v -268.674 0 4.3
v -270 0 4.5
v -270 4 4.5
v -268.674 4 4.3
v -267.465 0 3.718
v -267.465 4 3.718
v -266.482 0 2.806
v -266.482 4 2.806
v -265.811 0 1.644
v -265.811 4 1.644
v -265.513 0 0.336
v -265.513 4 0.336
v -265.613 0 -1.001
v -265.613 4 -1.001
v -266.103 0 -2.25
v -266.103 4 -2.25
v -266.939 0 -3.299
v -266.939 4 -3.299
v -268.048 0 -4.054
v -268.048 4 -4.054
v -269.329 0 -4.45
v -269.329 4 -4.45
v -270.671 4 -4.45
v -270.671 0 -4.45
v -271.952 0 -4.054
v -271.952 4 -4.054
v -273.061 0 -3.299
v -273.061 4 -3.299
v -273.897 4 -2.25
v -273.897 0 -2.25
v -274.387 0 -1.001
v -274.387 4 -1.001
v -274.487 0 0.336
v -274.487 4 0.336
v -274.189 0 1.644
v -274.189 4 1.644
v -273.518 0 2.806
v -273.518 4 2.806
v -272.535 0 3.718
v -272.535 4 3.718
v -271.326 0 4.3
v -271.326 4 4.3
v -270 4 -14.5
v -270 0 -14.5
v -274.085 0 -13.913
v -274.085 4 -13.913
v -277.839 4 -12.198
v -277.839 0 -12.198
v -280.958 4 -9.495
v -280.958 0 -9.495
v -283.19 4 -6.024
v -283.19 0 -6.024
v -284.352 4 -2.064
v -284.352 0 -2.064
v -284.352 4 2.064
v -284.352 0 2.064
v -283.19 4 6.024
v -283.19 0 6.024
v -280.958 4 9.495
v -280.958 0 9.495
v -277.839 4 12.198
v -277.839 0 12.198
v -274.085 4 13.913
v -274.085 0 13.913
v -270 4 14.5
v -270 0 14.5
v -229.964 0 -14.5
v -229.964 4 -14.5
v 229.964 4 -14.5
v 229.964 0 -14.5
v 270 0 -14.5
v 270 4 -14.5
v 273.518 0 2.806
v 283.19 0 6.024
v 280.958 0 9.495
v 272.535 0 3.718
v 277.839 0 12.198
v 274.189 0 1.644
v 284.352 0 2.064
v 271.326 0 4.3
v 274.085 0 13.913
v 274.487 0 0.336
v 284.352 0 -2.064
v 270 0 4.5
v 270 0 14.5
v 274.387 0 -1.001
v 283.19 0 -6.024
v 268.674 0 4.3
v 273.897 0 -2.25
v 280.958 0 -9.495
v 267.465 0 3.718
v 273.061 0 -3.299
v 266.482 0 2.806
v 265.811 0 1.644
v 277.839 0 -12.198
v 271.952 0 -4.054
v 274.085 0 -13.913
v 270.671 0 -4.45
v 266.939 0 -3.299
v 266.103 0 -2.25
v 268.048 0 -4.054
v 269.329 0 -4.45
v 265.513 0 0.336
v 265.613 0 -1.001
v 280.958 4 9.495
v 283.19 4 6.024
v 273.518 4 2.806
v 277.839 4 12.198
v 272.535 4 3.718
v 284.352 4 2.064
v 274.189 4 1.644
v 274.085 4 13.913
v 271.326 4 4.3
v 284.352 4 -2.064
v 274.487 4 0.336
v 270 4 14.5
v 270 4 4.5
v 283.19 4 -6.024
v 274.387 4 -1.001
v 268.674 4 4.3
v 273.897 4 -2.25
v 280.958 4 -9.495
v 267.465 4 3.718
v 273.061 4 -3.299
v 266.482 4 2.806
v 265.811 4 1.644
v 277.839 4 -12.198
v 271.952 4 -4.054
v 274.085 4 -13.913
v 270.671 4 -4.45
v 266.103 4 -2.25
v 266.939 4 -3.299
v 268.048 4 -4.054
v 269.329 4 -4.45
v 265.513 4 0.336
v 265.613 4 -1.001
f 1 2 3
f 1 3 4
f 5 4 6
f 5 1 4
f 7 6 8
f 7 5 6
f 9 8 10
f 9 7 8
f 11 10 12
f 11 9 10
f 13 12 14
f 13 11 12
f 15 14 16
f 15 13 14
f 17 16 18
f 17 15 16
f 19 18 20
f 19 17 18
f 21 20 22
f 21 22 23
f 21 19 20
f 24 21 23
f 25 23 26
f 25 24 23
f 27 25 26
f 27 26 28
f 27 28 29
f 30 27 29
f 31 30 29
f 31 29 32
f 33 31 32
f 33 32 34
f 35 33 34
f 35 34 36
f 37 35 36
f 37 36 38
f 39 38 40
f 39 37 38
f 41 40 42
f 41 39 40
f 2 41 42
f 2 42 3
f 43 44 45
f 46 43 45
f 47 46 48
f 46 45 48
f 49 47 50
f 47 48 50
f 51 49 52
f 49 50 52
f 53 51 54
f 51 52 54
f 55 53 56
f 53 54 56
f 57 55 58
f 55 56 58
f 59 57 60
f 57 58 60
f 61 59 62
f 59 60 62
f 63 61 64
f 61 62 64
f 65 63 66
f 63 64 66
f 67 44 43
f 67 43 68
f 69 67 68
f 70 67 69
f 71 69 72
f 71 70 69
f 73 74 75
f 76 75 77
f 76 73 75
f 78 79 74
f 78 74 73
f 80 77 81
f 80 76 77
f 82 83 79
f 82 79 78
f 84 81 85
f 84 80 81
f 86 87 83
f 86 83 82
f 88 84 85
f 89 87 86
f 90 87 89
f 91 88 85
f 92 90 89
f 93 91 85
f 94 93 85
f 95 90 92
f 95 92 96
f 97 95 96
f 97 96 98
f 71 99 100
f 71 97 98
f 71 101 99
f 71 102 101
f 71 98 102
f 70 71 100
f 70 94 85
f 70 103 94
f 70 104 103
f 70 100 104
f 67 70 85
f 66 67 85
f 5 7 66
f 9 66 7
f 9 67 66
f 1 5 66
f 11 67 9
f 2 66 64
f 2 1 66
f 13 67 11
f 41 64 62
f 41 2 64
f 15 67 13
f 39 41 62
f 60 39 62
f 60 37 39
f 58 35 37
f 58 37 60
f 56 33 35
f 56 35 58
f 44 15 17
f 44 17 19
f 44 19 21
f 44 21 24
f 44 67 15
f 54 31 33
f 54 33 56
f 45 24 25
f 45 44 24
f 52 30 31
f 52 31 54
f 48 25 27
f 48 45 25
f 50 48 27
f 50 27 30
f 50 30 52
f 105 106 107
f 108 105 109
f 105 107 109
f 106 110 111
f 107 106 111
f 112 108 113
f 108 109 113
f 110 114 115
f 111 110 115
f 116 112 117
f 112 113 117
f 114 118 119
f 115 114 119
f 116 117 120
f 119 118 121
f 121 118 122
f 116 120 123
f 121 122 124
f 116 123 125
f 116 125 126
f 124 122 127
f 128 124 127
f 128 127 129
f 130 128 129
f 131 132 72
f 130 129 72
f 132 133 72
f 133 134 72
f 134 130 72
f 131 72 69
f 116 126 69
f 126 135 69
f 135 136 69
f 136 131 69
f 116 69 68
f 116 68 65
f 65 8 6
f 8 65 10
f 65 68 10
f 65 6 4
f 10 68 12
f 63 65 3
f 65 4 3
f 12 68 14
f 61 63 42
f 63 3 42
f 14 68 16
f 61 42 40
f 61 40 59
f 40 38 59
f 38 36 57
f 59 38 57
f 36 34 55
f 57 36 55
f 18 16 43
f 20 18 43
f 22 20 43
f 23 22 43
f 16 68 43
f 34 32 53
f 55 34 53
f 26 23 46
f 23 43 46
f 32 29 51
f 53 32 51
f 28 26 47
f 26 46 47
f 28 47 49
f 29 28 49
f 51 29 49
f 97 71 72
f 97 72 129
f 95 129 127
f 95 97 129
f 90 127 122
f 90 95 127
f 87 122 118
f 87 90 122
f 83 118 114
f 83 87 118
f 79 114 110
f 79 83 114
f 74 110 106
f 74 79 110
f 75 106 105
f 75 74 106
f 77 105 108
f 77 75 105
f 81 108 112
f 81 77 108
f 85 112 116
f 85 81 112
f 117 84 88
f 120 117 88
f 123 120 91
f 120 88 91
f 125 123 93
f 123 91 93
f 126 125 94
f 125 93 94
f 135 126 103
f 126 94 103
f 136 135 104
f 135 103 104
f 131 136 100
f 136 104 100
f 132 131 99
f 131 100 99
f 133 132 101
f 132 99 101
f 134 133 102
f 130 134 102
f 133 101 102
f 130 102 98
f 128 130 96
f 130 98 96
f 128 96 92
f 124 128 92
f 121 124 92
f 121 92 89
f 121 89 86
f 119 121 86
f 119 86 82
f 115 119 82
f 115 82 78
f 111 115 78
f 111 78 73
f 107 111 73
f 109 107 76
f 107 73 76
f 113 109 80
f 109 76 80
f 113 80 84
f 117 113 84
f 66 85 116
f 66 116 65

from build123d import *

# Parameters (mm, degrees)
SKETCH1_R           = 4.5
SKETCH1_R_2         = 6.5
SKETCH1_R_3         = 1.75
BOSS_EXTRUDE1_DEPTH = 4
SKETCH2_R           = 2
CUT_EXTRUDE1_DEPTH  = 4
SKETCH3_W           = 459.927601586
SKETCH3_H           = 370.798064125
CUT_EXTRUDE2_DEPTH  = 10


with BuildPart() as part:
    # Sketch1 → Boss-Extrude1 (new body)
    with BuildSketch(Plane(origin=(0, 0, 0), x_dir=(1, 0, 0), z_dir=(0, 1, 0))):
        with BuildLine():
            Line((-270, -14.5), (0, -14.5))
            Line((0, -14.5), (0, 340))
            Line((0, 340), (-175.463800793, 340))
            ThreePointArc((-175.463800793, 340), (-185.71684912, 335.753048327), (-189.963800793, 325.5))
            Line((-189.963800793, 325.5), (-189.963800793, 225.606590828))
            ThreePointArc((-189.963800793, 225.606590828), (-204.963800793, 210.606590828), (-189.963800793, 195.606590828))
            Line((-189.963800793, 195.606590828), (-189.963800793, 54.5))
            Line((-189.963800793, 54.5), (-229.963800793, 14.5))
            Line((-229.963800793, 14.5), (-270, 14.5))
            ThreePointArc((-270, 14.5), (-284.5, 0), (-270, -14.5))
        make_face()
        with Locations(Location((-270, 0, 0), (0, 0, 270))):
            Circle(SKETCH1_R, mode=Mode.SUBTRACT)
        with Locations(Location((-175.463800793, 325.5, 0), (0, 0, 270))):
            Circle(SKETCH1_R, mode=Mode.SUBTRACT)
        with Locations(Location((-189.963800793, 210.606590828, 0), (0, 0, 270))):
            Circle(SKETCH1_R_2, mode=Mode.SUBTRACT)
        with Locations(Location((-180.213800793, 210.606590828, 0), (0, 0, 270))):
            Circle(SKETCH1_R_3, mode=Mode.SUBTRACT)
        with Locations(Location((-189.963800793, 220.406590828, 0), (0, 0, 270))):
            Circle(SKETCH1_R_3, mode=Mode.SUBTRACT)
        with Locations(Location((-189.963800793, 200.806590828, 0), (0, 0, 270))):
            Circle(SKETCH1_R_3, mode=Mode.SUBTRACT)
        with Locations(Location((-199.713800793, 210.606590828, 0), (0, 0, 270))):
            Circle(SKETCH1_R_3, mode=Mode.SUBTRACT)
    boss_extrude1 = extrude(amount=BOSS_EXTRUDE1_DEPTH)

    # Mirror1: Boss-Extrude1 across plane
    add(boss_extrude1.mirror(Plane(origin=(0, 4, -340), x_dir=(0, 0, 1), z_dir=(-1, 0, 0))))

    # Sketch2 → Cut-Extrude1 (cut)
    with BuildSketch(Plane(origin=(0, 4, 0), x_dir=(1, 0, 0), z_dir=(0, 1, 0))):
        with Locations(Location((0, 305.5, 0), (0, 0, 270))):
            Circle(SKETCH2_R)
    extrude(amount=-CUT_EXTRUDE1_DEPTH, mode=Mode.SUBTRACT)

    # Sketch3 → Cut-Extrude2 (cut)
    with BuildSketch(Plane(origin=(0, 4, 0), x_dir=(1, 0, 0), z_dir=(0, 1, 0))):
        with Locations((0, 199.899032062)):
            Rectangle(SKETCH3_W, SKETCH3_H)
    extrude(amount=-CUT_EXTRUDE2_DEPTH, mode=Mode.SUBTRACT)


solid = part.part
